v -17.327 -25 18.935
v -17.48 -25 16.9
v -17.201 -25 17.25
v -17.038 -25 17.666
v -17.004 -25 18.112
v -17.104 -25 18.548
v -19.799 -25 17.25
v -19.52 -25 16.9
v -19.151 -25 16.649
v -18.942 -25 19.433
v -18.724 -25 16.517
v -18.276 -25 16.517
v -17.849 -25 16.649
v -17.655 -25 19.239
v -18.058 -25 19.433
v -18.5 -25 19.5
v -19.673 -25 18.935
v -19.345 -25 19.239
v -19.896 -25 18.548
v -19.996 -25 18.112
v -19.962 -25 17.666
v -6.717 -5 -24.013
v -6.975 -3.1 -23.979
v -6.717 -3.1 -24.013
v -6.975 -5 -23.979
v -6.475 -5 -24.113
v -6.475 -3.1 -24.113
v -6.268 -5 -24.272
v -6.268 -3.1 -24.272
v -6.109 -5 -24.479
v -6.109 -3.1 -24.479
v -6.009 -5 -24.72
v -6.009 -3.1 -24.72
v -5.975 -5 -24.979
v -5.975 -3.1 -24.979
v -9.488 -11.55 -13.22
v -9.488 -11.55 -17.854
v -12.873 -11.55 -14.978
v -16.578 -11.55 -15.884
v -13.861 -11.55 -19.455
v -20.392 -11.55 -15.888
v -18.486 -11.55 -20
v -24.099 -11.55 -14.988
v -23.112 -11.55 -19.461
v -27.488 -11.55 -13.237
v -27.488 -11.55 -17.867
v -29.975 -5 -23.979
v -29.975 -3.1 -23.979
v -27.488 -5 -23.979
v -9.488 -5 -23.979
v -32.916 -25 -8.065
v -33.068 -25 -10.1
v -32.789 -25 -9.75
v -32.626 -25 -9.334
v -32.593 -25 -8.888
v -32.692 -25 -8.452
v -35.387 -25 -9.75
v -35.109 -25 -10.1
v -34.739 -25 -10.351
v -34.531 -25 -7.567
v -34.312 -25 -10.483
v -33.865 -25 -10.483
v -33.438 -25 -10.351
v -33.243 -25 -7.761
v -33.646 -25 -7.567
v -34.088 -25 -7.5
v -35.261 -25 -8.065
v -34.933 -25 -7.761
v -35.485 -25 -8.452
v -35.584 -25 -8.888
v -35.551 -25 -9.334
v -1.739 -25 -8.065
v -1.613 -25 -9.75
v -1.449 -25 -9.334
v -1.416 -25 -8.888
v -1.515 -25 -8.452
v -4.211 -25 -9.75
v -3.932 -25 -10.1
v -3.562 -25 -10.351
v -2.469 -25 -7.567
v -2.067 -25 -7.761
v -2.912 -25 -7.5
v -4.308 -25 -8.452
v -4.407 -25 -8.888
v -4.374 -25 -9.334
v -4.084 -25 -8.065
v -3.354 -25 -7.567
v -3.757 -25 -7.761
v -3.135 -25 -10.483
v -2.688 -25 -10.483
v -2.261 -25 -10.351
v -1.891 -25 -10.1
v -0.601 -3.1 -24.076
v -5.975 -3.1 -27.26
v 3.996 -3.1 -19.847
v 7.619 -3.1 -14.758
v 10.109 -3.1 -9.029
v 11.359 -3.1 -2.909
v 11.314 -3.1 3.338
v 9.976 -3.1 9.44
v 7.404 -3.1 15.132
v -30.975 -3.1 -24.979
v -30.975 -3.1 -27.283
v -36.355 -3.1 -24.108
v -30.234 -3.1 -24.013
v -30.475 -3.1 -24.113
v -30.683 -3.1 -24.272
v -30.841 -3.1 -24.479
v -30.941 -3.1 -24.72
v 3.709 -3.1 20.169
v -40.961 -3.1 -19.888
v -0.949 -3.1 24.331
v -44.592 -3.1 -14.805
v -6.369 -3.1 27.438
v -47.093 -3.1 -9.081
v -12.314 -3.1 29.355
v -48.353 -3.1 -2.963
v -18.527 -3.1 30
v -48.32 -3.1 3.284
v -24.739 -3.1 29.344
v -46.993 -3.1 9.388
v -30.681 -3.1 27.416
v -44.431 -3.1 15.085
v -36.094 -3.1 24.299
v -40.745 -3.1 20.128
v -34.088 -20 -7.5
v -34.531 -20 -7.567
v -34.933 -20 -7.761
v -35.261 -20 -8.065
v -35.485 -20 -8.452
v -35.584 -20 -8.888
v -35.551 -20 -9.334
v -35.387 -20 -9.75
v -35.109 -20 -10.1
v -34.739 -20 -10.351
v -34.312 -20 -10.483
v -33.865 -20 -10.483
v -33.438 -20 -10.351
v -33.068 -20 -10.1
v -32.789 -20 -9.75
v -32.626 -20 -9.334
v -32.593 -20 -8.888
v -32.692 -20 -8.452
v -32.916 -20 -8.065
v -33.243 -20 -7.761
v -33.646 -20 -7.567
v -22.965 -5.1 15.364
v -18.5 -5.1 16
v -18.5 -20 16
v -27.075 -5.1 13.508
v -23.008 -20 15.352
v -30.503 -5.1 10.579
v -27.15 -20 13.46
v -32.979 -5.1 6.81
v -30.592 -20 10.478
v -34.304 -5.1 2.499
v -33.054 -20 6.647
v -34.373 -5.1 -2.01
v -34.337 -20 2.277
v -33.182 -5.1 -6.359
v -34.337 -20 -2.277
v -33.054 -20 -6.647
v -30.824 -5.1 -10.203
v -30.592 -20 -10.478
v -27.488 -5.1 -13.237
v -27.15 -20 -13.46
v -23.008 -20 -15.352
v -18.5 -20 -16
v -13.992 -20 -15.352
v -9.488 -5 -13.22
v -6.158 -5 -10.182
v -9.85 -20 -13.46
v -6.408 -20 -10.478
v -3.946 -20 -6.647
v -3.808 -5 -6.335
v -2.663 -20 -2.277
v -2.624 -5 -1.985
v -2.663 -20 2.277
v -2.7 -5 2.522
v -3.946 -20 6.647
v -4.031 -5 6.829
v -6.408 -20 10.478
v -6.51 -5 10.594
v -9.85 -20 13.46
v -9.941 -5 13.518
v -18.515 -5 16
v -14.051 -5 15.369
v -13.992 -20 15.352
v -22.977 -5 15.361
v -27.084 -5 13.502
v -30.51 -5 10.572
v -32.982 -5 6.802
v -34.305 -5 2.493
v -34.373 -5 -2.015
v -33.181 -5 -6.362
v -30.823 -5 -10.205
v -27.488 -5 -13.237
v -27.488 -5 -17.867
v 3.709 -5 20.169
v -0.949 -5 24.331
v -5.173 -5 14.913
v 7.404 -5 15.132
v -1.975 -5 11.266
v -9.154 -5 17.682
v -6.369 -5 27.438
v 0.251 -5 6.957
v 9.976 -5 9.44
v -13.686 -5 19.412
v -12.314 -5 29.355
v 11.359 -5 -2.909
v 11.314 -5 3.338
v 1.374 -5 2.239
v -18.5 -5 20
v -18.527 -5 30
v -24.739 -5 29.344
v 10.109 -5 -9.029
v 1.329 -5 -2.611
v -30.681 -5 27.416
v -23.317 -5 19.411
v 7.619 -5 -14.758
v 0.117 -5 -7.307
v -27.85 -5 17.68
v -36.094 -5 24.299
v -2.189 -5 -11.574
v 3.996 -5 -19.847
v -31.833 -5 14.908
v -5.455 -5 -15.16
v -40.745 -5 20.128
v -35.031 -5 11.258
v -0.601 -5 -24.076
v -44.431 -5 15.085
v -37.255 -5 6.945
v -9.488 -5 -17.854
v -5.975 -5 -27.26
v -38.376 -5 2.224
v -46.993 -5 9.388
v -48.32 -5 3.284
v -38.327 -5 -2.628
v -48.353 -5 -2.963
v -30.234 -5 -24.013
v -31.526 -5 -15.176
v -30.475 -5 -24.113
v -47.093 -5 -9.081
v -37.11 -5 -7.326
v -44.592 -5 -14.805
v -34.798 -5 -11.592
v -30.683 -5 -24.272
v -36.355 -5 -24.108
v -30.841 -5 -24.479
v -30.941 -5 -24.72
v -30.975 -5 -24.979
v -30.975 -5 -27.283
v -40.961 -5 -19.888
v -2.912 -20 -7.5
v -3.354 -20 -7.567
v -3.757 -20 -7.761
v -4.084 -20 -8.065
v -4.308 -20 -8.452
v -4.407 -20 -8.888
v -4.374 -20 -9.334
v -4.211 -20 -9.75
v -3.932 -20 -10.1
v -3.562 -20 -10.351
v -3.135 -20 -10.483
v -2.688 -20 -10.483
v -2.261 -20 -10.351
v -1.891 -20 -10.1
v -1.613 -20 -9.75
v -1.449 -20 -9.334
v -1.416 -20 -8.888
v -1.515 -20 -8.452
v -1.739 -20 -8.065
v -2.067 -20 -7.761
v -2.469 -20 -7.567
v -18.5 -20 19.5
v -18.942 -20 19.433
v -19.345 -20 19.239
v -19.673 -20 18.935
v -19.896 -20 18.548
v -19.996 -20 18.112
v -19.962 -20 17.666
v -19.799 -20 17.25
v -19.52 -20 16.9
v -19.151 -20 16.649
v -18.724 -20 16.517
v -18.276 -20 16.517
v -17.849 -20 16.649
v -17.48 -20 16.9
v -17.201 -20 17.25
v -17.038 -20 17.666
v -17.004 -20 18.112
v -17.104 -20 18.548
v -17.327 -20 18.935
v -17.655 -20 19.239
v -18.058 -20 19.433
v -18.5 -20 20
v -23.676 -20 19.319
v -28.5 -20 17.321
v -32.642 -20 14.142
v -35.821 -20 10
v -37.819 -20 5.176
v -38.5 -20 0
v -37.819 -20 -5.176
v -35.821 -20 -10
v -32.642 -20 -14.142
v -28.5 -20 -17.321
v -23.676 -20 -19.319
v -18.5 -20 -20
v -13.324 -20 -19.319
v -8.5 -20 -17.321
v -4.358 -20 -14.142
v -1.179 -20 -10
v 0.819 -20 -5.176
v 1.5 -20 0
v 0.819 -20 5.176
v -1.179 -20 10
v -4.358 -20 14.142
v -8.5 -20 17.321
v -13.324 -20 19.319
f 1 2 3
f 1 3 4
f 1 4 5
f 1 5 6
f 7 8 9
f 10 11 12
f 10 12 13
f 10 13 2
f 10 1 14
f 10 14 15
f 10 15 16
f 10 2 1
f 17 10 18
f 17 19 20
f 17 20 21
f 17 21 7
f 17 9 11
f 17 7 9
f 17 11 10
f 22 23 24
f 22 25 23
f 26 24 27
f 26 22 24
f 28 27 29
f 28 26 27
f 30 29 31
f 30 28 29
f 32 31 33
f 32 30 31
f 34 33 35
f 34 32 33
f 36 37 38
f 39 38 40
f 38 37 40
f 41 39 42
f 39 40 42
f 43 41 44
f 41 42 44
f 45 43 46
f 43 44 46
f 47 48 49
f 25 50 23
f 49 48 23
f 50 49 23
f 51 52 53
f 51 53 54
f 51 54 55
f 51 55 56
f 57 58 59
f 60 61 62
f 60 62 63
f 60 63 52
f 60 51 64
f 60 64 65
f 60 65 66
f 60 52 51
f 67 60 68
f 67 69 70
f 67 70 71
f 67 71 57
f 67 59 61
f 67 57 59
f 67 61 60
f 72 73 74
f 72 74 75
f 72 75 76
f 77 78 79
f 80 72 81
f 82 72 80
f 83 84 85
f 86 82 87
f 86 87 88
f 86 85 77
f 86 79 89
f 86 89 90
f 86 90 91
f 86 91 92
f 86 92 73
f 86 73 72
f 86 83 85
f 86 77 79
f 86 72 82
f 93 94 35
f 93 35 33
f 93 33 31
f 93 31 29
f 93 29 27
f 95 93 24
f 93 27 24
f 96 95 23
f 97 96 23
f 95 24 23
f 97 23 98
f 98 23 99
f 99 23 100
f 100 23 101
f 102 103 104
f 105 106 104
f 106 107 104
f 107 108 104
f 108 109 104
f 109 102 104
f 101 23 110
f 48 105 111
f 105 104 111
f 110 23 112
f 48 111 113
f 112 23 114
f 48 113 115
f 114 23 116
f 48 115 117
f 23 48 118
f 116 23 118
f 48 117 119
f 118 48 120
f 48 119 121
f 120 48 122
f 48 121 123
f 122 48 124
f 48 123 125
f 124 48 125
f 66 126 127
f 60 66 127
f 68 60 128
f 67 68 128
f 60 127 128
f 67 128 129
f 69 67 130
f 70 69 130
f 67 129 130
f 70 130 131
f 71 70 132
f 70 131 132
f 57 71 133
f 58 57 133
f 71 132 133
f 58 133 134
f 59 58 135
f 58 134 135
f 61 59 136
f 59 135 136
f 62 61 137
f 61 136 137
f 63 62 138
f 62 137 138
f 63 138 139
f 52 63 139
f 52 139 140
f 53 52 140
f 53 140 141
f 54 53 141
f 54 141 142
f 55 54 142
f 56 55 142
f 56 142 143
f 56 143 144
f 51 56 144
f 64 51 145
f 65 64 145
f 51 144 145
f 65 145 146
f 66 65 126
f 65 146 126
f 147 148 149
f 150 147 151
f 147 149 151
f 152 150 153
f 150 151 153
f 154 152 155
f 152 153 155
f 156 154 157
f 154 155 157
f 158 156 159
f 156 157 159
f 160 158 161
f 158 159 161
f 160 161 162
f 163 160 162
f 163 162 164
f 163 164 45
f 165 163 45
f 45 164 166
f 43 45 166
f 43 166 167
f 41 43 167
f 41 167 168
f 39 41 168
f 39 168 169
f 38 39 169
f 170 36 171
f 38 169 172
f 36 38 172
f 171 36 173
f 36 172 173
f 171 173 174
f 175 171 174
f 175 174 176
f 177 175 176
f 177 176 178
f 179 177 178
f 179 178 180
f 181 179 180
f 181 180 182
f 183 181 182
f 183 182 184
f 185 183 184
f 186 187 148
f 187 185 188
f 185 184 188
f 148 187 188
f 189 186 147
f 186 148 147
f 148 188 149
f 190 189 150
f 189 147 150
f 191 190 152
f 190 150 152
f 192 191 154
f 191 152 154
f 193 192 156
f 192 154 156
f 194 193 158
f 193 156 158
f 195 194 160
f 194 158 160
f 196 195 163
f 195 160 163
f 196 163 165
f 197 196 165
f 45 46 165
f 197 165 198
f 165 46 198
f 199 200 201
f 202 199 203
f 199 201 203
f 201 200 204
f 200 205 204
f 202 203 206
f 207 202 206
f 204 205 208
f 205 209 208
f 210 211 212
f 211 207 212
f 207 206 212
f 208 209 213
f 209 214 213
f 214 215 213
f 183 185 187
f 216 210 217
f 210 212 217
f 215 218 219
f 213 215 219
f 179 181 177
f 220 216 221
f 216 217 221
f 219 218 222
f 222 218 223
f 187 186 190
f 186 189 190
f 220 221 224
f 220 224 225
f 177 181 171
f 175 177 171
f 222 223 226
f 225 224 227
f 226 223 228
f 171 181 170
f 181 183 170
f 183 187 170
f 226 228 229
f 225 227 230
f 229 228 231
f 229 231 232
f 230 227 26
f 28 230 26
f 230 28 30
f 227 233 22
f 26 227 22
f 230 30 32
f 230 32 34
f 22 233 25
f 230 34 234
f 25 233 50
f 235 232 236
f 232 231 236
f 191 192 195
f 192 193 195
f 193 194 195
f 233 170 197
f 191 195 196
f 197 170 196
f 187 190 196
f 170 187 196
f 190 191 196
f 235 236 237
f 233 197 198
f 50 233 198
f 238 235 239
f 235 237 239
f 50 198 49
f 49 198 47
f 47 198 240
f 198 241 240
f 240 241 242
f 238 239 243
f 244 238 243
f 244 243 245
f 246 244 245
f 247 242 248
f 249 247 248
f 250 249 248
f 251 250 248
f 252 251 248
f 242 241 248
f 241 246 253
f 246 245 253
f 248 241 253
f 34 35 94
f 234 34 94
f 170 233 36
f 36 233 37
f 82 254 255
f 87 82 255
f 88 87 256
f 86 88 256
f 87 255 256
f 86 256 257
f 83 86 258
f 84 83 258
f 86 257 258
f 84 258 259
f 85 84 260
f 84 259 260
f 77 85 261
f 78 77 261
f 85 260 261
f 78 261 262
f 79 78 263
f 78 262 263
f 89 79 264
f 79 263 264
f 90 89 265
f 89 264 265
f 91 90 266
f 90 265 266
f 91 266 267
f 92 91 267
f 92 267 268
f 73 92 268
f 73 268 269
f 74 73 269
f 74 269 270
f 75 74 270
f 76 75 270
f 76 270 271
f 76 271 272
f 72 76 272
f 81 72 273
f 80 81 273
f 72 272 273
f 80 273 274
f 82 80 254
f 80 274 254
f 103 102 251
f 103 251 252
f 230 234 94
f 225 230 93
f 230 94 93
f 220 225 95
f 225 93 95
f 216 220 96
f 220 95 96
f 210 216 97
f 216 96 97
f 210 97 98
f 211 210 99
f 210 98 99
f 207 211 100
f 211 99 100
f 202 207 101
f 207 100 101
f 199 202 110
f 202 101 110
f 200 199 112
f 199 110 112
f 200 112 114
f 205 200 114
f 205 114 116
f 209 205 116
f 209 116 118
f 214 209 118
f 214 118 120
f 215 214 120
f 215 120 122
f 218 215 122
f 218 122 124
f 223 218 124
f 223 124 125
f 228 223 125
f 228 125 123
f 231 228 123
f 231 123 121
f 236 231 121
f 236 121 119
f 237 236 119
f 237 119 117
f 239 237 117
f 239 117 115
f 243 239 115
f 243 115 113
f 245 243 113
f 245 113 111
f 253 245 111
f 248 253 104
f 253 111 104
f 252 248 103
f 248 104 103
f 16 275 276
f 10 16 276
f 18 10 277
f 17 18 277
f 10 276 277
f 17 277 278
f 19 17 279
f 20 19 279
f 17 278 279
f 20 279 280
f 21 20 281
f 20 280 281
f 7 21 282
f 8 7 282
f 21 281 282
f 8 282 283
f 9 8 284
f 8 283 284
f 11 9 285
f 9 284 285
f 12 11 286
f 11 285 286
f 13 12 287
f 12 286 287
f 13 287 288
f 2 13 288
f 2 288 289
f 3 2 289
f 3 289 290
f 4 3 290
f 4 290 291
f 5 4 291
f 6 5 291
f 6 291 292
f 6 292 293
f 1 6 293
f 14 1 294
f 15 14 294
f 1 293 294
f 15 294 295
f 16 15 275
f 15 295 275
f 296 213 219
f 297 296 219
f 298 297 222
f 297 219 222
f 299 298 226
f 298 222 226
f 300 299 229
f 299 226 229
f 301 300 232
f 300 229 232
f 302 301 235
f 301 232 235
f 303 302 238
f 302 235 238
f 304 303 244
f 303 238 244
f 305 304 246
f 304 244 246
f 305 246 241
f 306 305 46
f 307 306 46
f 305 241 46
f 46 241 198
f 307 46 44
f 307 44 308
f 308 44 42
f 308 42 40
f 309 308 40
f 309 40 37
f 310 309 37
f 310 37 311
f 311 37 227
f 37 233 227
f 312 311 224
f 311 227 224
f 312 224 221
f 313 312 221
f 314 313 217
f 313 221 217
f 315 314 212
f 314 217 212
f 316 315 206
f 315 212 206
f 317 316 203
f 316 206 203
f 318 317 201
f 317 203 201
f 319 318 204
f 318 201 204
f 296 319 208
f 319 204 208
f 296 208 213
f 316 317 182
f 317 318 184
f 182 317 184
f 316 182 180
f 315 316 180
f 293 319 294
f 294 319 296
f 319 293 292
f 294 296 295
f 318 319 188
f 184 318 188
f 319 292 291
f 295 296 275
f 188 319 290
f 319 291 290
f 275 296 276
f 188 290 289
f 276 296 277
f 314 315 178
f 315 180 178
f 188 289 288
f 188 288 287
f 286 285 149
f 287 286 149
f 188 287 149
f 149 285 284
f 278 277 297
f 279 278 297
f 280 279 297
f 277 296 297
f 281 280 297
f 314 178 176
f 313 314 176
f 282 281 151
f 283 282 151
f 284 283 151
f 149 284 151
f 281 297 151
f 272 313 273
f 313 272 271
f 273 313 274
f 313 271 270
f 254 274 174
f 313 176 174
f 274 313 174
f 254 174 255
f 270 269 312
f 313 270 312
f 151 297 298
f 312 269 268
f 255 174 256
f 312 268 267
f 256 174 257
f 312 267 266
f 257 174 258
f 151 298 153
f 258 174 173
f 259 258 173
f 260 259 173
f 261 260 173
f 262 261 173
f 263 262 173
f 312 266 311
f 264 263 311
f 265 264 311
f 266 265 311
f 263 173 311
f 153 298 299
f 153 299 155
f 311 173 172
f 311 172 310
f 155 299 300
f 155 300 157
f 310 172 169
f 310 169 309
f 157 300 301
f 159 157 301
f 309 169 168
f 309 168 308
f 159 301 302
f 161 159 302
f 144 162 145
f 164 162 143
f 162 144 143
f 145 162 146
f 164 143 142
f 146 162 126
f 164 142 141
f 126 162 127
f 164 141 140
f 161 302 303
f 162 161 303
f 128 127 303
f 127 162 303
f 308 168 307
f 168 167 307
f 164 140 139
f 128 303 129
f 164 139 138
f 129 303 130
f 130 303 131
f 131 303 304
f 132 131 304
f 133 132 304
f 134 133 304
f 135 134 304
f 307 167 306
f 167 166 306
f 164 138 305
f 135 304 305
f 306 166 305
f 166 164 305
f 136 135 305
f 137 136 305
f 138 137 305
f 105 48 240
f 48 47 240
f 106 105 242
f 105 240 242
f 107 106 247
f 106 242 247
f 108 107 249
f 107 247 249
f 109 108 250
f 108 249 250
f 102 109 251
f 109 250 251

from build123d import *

# Parameters (mm, degrees)
SKETCH4_R               = 1.5
BOSS_EXTRUDE1_DEPTH     = 5
SKETCH5_W               = 25
SKETCH5_H               = 6.621086299
CUT_EXTRUDE5_DEPTH      = 5
FILLET1_R               = 1
CUT_EXTRUDE9_DEPTH      = 77.752708656
CUT_EXTRUDE9_DEPTH_BACK = 15
MOVE_FACE1_BY           = 0.1


with BuildPart() as part:
    # Sketch2 → Revolve3 (revolve)
    with BuildSketch(Plane.XY, mode=Mode.PRIVATE) as revolve3_sk:
        Polygon((1.5, -20), (1.5, -5), (11.5, -5), (11.5, -3.1), (-18.5, -3.1), (-18.5, -5.1), (-2.5, -5.1), (-2.5, -20), align=None)
    revolve(revolve3_sk.sketch.rotate(Axis((-18.5, -3.1, 0), (0, -1, 0)), 90), axis=Axis((-18.5, -3.1, 0), (0, -1, 0)))

    # Sketch4 → Boss-Extrude1 (add)
    with BuildSketch(Plane.XZ.offset(20)):
        with Locations(Location((-2.911542732, -9, 0), (0, 0, 90))):
            Circle(SKETCH4_R)
        with Locations(Location((-18.5, 18, 0), (0, 0, 90))):
            Circle(SKETCH4_R)
        with Locations(Location((-34.088457268, -9, 0), (0, 0, 90))):
            Circle(SKETCH4_R)
    extrude(amount=BOSS_EXTRUDE1_DEPTH)

    # Sketch5 → Cut-Extrude5 (cut)
    with BuildSketch(Plane(origin=(0, -3.1, 0), x_dir=(1, 0, 0), z_dir=(0, 1, 0))):
        with Locations((-18.475404108, 27.289504664)):
            Rectangle(SKETCH5_W, SKETCH5_H)
    extrude(amount=-CUT_EXTRUDE5_DEPTH, mode=Mode.SUBTRACT)

    # Fillet1
    fillet1_edges = [part.edges().sort_by_distance(p)[0] for p in [
        (-5.975404108, -4.05, -23.978961514),
        (-30.975404108, -4.05, -23.978961514),
    ]]
    fillet(fillet1_edges, radius=FILLET1_R)

    # Sketch6 → Cut-Extrude9 (cut, two sides)
    with BuildSketch(Plane(origin=(0, 0, -23.978961514), x_dir=(-1, 0, 0), z_dir=(0, 0, -1))) as cut_extrude9_sk:
        Polygon((18.487702054, -11.55), (18.478169327, -5), (9.487702054, -5), (9.487702054, -11.55), align=None)
        Polygon((27.487702054, -5), (18.478169327, -5), (18.487702054, -11.55), (27.487702054, -11.55), align=None)
    extrude(amount=CUT_EXTRUDE9_DEPTH, mode=Mode.SUBTRACT)
    extrude(cut_extrude9_sk.sketch, amount=-CUT_EXTRUDE9_DEPTH_BACK, mode=Mode.SUBTRACT)

    # Move Face1: a face moved inward by 0.1
    extrude(part.faces().sort_by_distance((-18.501355787, -5.1, 1.924560303))[0], amount=MOVE_FACE1_BY, dir=(0, 1, 0), mode=Mode.SUBTRACT)


solid = part.part
